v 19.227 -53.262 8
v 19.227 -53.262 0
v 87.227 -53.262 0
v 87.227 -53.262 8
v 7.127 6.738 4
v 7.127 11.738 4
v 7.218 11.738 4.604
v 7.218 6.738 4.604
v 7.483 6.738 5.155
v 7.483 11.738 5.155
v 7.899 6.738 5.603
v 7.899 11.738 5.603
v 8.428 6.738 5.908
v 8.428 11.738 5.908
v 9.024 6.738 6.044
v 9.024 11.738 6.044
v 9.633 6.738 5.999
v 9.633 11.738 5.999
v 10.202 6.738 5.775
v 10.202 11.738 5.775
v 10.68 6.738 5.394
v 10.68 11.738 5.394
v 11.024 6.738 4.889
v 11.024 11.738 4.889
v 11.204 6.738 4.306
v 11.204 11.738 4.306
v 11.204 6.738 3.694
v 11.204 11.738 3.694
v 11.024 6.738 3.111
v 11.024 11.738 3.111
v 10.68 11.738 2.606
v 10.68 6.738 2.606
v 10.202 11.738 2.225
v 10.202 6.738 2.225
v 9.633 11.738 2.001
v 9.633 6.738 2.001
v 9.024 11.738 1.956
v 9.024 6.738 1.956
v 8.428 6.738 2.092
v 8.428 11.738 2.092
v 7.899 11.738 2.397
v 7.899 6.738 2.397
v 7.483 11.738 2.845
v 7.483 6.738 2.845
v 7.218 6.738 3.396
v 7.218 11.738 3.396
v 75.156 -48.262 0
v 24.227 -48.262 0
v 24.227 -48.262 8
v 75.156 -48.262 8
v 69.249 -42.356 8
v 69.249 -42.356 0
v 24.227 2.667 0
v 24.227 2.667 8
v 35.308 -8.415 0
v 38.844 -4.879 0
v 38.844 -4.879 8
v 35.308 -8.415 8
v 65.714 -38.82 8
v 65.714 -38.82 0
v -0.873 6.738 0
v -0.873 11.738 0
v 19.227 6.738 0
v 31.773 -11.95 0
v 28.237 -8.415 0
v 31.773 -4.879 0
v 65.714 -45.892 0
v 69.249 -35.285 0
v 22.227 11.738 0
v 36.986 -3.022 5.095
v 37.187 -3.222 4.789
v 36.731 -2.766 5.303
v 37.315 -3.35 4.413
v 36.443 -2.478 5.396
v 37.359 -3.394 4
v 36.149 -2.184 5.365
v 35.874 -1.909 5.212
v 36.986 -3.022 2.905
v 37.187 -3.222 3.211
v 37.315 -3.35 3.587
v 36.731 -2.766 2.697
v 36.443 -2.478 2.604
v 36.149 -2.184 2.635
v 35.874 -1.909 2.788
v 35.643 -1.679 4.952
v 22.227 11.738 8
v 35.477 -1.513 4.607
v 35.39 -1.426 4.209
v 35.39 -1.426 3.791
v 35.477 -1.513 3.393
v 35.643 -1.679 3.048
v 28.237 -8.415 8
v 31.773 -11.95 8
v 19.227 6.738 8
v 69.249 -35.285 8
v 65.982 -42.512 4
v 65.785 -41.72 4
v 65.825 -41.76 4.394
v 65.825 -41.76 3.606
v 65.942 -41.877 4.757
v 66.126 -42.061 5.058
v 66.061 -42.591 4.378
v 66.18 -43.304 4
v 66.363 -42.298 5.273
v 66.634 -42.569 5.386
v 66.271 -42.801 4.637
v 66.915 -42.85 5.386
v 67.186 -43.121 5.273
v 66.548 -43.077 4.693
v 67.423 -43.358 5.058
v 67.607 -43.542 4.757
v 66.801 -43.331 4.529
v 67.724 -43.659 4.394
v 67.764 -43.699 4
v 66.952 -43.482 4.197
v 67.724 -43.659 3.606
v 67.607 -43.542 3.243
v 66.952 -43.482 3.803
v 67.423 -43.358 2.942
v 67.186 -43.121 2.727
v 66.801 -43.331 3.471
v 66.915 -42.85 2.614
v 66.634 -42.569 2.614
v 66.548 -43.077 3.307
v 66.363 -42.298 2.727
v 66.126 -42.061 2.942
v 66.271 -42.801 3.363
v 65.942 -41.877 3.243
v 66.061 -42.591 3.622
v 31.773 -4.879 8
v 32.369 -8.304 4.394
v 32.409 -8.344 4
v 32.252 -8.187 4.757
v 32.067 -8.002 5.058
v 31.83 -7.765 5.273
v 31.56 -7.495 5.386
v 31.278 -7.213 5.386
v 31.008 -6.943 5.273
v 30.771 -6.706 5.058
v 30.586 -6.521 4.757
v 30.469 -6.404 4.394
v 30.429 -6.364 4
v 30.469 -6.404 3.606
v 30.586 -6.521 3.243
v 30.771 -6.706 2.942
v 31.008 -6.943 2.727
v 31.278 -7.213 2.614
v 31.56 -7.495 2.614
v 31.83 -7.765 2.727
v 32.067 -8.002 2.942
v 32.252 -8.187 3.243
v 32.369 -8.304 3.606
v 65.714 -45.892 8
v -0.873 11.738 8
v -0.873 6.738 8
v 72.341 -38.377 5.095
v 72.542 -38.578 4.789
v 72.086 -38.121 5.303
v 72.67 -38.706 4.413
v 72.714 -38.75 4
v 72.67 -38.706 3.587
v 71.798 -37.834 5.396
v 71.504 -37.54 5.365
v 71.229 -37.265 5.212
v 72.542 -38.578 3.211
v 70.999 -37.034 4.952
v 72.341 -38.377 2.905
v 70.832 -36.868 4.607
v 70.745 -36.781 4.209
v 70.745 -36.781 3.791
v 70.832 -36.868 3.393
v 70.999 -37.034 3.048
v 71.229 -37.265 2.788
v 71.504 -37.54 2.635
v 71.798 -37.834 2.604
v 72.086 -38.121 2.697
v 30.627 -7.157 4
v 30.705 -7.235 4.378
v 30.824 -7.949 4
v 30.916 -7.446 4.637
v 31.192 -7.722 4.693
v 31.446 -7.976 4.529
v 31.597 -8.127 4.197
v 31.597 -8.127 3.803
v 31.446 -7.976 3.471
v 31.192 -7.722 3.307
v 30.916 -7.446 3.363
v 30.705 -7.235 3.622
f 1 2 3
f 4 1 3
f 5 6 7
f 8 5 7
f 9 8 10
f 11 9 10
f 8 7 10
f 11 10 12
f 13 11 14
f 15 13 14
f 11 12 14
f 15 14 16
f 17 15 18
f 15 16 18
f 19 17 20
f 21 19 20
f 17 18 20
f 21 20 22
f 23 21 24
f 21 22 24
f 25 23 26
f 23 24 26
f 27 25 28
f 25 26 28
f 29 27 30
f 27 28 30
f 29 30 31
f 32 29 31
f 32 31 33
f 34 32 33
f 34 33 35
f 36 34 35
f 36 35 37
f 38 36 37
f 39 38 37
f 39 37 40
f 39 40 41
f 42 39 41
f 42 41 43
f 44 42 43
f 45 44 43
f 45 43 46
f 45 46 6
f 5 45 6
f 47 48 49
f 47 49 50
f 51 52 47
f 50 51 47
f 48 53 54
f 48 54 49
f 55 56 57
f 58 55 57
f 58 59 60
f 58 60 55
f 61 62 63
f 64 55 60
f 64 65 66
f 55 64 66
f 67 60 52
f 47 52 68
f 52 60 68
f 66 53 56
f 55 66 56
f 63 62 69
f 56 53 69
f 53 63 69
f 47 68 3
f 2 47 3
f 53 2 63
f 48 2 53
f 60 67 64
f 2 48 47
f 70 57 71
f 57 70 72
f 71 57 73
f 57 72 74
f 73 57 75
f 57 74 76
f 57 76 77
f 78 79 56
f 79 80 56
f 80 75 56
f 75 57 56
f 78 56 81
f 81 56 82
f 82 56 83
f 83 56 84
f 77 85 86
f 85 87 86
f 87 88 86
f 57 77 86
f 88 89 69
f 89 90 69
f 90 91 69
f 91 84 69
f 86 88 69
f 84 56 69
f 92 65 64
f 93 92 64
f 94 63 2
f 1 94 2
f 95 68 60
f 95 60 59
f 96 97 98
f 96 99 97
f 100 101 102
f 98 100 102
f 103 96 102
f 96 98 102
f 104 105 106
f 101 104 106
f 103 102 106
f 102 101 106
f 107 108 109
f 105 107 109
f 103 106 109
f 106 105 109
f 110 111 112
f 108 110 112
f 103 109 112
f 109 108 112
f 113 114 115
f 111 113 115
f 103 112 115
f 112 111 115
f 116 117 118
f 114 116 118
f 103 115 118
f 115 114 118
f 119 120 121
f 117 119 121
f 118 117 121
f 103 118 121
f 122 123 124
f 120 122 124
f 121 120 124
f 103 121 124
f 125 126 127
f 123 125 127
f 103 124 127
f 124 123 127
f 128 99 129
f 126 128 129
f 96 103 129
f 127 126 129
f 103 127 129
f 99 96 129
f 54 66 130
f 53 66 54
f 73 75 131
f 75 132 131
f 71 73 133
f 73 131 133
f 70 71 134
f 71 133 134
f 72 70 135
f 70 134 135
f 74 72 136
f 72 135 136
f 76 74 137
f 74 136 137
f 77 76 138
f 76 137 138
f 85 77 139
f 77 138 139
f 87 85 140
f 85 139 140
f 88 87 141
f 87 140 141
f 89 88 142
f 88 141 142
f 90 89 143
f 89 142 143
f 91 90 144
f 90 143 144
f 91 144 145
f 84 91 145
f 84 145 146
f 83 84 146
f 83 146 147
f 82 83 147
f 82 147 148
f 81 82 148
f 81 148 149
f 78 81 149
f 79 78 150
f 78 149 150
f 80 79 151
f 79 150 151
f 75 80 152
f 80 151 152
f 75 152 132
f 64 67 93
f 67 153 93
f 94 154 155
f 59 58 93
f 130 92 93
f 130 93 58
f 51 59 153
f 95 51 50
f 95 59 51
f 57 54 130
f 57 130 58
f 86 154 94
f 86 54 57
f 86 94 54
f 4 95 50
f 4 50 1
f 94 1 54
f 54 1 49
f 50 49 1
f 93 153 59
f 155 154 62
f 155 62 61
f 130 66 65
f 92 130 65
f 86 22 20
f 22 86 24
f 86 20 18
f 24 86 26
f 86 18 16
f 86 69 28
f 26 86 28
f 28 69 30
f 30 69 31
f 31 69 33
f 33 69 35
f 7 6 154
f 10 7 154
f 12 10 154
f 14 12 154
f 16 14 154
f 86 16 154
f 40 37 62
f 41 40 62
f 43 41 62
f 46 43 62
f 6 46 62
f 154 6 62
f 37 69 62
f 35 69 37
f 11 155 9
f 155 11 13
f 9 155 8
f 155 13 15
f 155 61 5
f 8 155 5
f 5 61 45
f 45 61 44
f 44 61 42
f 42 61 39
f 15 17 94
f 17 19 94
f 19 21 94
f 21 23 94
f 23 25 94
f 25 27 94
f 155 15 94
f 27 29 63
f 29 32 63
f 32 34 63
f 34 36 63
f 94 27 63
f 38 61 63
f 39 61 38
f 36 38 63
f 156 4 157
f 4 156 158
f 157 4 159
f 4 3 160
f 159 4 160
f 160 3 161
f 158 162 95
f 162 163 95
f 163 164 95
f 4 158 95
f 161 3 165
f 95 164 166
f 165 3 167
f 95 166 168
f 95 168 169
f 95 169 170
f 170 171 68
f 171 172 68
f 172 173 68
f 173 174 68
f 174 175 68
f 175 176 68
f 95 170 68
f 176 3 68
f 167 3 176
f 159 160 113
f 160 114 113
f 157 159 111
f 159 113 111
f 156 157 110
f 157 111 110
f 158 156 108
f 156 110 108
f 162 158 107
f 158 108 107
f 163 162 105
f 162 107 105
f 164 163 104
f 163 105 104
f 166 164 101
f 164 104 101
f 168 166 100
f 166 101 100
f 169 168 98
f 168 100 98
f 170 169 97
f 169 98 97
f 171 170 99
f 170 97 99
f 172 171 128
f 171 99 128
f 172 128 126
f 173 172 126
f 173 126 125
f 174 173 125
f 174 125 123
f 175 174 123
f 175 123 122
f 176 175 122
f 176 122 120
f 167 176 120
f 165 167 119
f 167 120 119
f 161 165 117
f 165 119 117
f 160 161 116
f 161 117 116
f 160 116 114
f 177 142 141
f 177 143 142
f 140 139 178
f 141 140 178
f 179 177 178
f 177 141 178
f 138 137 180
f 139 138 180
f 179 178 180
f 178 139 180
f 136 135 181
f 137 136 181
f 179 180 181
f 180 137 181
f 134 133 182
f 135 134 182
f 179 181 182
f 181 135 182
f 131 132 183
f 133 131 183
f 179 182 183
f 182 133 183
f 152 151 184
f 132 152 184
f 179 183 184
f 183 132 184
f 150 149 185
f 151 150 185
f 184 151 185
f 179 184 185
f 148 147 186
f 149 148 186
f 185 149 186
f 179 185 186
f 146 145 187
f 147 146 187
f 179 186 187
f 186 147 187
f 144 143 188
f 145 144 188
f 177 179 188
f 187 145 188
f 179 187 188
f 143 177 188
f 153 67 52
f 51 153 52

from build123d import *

# Parameters (mm, degrees)
F1_DEPTH    = 8
F3_D        = 4.1
F3_DEPTH    = 7
F3_TIP      = 1.231764269
F4_W        = 43
F4_H        = 8
F5_DEPTH    = 5
F6_T        = 5
F6_T3_DEPTH = 18
F7_D        = 2.8
F7_DEPTH    = 7
F7_TIP      = 0.8412048666


# Not quite as in the source:
# - a shell that OpenCascade refuses in one call is made with other operations: the cavity is built on its own and cut out


with BuildPart() as f1:
    # F0 (on Top) → F1 (new body)
    with BuildSketch(Plane.XY):
        Polygon((22.2267507434, 11.7376726019), (-0.8732492566, 11.7376726019), (-0.8732492566, 6.7376726019), (19.2267507434, 6.7376726019), (19.2267507434, -53.2623273981), (87.2267507434, -53.2623273981), align=None)
    extrude(amount=F1_DEPTH)

    # F3
    with Locations(Plane.XZ.offset(-6.7376726019)):
        with Locations((9.1767507434, 4)):
            Hole(F3_D / 2, depth=F3_DEPTH)
            with Locations((0, 0, -(F3_DEPTH + F3_TIP / 2))):  # 118° drill point
                Cone(0, F3_D / 2, F3_TIP, mode=Mode.SUBTRACT)

    # F4 (on face) → F5 (cut)
    with BuildSketch(Plane(origin=(16.9822116726, 16.9822116726, 0), x_dir=(-0.7071067812, 0.7071067812, 0), z_dir=(0.7071067812, 0.7071067812, 0))):
        with Locations((-52.4168982823, 4)):
            Rectangle(F4_W, F4_H)
    extrude(amount=-F5_DEPTH, mode=Mode.SUBTRACT)

    # F6: shell of thickness 5, made by hand


with BuildPart() as f6_core1:
    # F6_t2: copy of F1
    add(f1.part)

    # the walls: a layer under each face that stays
    f6_faces = [f6_core1.faces().sort_by_distance(p)[0] for p in [
        (18.3767507434, 11.7376726019, 6.6666666667),
        (30.5352554223, 3.4291679229, 4),
        (-0.8732492566, 9.2376726019, 4),
        (7.1267507434, 9.2376726019, 4),
        (37.0759931483, -6.647103709, 4),
        (50.5110219908, -23.6176664575, 4),
        (67.4815847393, -37.0526953, 4),
        (78.2380512178, -44.2736278726, 4),
        (53.2267507434, -53.2623273981, 4),
        (19.2267507434, -23.2623273981, 4),
        (2.4767507434, 6.7376726019, 6.6666666667),
    ]]
    thicken(f6_faces, amount=-F6_T, mode=Mode.SUBTRACT)

    # F6_s4 → F6_t3 (cut)
    with BuildSketch(Plane.XY.offset(-5)):
        Polygon((35.3789368734, -8.414870662), (31.7726922894, -4.879336756), (28.2371583834, -8.414870662), (31.7726922894, -11.9504045679), align=None)
        Polygon((65.7138177863, -38.7497515749), (62.1782838804, -42.3559961589), (65.7138177863, -45.8915300648), (69.2493516923, -42.3559961589), align=None)
        Polygon((19.1767507434, 6.6876726019), (24.2267507434, 6.7376726019), (24.2267507434, 11.7376726019), (19.2267507434, 11.7376726019), align=None)
    extrude(amount=F6_T3_DEPTH, mode=Mode.SUBTRACT)


with BuildPart() as f1_1:
    add(f1.part)

    # what is left inside the walls is the cavity
    f6_cavity = [f6_core1.part.solids().sort_by_distance(p)[0] for p in [
        (49.691217, -31.286017, 0.05),
    ]]
    add(f6_cavity, mode=Mode.SUBTRACT)

    # F7
    with Locations(Plane(origin=(16.9822116726, 16.9822116726, 0), x_dir=(-0.7071067812, 0.7071067812, 0), z_dir=(0.7071067812, 0.7071067812, 0))):
        with Locations((-27.4168982823, 4), (-77.4168982823, 4)):
            Hole(F7_D / 2, depth=F7_DEPTH)
            with Locations((0, 0, -(F7_DEPTH + F7_TIP / 2))):  # 118° drill point
                Cone(0, F7_D / 2, F7_TIP, mode=Mode.SUBTRACT)


solid = f1_1.part
